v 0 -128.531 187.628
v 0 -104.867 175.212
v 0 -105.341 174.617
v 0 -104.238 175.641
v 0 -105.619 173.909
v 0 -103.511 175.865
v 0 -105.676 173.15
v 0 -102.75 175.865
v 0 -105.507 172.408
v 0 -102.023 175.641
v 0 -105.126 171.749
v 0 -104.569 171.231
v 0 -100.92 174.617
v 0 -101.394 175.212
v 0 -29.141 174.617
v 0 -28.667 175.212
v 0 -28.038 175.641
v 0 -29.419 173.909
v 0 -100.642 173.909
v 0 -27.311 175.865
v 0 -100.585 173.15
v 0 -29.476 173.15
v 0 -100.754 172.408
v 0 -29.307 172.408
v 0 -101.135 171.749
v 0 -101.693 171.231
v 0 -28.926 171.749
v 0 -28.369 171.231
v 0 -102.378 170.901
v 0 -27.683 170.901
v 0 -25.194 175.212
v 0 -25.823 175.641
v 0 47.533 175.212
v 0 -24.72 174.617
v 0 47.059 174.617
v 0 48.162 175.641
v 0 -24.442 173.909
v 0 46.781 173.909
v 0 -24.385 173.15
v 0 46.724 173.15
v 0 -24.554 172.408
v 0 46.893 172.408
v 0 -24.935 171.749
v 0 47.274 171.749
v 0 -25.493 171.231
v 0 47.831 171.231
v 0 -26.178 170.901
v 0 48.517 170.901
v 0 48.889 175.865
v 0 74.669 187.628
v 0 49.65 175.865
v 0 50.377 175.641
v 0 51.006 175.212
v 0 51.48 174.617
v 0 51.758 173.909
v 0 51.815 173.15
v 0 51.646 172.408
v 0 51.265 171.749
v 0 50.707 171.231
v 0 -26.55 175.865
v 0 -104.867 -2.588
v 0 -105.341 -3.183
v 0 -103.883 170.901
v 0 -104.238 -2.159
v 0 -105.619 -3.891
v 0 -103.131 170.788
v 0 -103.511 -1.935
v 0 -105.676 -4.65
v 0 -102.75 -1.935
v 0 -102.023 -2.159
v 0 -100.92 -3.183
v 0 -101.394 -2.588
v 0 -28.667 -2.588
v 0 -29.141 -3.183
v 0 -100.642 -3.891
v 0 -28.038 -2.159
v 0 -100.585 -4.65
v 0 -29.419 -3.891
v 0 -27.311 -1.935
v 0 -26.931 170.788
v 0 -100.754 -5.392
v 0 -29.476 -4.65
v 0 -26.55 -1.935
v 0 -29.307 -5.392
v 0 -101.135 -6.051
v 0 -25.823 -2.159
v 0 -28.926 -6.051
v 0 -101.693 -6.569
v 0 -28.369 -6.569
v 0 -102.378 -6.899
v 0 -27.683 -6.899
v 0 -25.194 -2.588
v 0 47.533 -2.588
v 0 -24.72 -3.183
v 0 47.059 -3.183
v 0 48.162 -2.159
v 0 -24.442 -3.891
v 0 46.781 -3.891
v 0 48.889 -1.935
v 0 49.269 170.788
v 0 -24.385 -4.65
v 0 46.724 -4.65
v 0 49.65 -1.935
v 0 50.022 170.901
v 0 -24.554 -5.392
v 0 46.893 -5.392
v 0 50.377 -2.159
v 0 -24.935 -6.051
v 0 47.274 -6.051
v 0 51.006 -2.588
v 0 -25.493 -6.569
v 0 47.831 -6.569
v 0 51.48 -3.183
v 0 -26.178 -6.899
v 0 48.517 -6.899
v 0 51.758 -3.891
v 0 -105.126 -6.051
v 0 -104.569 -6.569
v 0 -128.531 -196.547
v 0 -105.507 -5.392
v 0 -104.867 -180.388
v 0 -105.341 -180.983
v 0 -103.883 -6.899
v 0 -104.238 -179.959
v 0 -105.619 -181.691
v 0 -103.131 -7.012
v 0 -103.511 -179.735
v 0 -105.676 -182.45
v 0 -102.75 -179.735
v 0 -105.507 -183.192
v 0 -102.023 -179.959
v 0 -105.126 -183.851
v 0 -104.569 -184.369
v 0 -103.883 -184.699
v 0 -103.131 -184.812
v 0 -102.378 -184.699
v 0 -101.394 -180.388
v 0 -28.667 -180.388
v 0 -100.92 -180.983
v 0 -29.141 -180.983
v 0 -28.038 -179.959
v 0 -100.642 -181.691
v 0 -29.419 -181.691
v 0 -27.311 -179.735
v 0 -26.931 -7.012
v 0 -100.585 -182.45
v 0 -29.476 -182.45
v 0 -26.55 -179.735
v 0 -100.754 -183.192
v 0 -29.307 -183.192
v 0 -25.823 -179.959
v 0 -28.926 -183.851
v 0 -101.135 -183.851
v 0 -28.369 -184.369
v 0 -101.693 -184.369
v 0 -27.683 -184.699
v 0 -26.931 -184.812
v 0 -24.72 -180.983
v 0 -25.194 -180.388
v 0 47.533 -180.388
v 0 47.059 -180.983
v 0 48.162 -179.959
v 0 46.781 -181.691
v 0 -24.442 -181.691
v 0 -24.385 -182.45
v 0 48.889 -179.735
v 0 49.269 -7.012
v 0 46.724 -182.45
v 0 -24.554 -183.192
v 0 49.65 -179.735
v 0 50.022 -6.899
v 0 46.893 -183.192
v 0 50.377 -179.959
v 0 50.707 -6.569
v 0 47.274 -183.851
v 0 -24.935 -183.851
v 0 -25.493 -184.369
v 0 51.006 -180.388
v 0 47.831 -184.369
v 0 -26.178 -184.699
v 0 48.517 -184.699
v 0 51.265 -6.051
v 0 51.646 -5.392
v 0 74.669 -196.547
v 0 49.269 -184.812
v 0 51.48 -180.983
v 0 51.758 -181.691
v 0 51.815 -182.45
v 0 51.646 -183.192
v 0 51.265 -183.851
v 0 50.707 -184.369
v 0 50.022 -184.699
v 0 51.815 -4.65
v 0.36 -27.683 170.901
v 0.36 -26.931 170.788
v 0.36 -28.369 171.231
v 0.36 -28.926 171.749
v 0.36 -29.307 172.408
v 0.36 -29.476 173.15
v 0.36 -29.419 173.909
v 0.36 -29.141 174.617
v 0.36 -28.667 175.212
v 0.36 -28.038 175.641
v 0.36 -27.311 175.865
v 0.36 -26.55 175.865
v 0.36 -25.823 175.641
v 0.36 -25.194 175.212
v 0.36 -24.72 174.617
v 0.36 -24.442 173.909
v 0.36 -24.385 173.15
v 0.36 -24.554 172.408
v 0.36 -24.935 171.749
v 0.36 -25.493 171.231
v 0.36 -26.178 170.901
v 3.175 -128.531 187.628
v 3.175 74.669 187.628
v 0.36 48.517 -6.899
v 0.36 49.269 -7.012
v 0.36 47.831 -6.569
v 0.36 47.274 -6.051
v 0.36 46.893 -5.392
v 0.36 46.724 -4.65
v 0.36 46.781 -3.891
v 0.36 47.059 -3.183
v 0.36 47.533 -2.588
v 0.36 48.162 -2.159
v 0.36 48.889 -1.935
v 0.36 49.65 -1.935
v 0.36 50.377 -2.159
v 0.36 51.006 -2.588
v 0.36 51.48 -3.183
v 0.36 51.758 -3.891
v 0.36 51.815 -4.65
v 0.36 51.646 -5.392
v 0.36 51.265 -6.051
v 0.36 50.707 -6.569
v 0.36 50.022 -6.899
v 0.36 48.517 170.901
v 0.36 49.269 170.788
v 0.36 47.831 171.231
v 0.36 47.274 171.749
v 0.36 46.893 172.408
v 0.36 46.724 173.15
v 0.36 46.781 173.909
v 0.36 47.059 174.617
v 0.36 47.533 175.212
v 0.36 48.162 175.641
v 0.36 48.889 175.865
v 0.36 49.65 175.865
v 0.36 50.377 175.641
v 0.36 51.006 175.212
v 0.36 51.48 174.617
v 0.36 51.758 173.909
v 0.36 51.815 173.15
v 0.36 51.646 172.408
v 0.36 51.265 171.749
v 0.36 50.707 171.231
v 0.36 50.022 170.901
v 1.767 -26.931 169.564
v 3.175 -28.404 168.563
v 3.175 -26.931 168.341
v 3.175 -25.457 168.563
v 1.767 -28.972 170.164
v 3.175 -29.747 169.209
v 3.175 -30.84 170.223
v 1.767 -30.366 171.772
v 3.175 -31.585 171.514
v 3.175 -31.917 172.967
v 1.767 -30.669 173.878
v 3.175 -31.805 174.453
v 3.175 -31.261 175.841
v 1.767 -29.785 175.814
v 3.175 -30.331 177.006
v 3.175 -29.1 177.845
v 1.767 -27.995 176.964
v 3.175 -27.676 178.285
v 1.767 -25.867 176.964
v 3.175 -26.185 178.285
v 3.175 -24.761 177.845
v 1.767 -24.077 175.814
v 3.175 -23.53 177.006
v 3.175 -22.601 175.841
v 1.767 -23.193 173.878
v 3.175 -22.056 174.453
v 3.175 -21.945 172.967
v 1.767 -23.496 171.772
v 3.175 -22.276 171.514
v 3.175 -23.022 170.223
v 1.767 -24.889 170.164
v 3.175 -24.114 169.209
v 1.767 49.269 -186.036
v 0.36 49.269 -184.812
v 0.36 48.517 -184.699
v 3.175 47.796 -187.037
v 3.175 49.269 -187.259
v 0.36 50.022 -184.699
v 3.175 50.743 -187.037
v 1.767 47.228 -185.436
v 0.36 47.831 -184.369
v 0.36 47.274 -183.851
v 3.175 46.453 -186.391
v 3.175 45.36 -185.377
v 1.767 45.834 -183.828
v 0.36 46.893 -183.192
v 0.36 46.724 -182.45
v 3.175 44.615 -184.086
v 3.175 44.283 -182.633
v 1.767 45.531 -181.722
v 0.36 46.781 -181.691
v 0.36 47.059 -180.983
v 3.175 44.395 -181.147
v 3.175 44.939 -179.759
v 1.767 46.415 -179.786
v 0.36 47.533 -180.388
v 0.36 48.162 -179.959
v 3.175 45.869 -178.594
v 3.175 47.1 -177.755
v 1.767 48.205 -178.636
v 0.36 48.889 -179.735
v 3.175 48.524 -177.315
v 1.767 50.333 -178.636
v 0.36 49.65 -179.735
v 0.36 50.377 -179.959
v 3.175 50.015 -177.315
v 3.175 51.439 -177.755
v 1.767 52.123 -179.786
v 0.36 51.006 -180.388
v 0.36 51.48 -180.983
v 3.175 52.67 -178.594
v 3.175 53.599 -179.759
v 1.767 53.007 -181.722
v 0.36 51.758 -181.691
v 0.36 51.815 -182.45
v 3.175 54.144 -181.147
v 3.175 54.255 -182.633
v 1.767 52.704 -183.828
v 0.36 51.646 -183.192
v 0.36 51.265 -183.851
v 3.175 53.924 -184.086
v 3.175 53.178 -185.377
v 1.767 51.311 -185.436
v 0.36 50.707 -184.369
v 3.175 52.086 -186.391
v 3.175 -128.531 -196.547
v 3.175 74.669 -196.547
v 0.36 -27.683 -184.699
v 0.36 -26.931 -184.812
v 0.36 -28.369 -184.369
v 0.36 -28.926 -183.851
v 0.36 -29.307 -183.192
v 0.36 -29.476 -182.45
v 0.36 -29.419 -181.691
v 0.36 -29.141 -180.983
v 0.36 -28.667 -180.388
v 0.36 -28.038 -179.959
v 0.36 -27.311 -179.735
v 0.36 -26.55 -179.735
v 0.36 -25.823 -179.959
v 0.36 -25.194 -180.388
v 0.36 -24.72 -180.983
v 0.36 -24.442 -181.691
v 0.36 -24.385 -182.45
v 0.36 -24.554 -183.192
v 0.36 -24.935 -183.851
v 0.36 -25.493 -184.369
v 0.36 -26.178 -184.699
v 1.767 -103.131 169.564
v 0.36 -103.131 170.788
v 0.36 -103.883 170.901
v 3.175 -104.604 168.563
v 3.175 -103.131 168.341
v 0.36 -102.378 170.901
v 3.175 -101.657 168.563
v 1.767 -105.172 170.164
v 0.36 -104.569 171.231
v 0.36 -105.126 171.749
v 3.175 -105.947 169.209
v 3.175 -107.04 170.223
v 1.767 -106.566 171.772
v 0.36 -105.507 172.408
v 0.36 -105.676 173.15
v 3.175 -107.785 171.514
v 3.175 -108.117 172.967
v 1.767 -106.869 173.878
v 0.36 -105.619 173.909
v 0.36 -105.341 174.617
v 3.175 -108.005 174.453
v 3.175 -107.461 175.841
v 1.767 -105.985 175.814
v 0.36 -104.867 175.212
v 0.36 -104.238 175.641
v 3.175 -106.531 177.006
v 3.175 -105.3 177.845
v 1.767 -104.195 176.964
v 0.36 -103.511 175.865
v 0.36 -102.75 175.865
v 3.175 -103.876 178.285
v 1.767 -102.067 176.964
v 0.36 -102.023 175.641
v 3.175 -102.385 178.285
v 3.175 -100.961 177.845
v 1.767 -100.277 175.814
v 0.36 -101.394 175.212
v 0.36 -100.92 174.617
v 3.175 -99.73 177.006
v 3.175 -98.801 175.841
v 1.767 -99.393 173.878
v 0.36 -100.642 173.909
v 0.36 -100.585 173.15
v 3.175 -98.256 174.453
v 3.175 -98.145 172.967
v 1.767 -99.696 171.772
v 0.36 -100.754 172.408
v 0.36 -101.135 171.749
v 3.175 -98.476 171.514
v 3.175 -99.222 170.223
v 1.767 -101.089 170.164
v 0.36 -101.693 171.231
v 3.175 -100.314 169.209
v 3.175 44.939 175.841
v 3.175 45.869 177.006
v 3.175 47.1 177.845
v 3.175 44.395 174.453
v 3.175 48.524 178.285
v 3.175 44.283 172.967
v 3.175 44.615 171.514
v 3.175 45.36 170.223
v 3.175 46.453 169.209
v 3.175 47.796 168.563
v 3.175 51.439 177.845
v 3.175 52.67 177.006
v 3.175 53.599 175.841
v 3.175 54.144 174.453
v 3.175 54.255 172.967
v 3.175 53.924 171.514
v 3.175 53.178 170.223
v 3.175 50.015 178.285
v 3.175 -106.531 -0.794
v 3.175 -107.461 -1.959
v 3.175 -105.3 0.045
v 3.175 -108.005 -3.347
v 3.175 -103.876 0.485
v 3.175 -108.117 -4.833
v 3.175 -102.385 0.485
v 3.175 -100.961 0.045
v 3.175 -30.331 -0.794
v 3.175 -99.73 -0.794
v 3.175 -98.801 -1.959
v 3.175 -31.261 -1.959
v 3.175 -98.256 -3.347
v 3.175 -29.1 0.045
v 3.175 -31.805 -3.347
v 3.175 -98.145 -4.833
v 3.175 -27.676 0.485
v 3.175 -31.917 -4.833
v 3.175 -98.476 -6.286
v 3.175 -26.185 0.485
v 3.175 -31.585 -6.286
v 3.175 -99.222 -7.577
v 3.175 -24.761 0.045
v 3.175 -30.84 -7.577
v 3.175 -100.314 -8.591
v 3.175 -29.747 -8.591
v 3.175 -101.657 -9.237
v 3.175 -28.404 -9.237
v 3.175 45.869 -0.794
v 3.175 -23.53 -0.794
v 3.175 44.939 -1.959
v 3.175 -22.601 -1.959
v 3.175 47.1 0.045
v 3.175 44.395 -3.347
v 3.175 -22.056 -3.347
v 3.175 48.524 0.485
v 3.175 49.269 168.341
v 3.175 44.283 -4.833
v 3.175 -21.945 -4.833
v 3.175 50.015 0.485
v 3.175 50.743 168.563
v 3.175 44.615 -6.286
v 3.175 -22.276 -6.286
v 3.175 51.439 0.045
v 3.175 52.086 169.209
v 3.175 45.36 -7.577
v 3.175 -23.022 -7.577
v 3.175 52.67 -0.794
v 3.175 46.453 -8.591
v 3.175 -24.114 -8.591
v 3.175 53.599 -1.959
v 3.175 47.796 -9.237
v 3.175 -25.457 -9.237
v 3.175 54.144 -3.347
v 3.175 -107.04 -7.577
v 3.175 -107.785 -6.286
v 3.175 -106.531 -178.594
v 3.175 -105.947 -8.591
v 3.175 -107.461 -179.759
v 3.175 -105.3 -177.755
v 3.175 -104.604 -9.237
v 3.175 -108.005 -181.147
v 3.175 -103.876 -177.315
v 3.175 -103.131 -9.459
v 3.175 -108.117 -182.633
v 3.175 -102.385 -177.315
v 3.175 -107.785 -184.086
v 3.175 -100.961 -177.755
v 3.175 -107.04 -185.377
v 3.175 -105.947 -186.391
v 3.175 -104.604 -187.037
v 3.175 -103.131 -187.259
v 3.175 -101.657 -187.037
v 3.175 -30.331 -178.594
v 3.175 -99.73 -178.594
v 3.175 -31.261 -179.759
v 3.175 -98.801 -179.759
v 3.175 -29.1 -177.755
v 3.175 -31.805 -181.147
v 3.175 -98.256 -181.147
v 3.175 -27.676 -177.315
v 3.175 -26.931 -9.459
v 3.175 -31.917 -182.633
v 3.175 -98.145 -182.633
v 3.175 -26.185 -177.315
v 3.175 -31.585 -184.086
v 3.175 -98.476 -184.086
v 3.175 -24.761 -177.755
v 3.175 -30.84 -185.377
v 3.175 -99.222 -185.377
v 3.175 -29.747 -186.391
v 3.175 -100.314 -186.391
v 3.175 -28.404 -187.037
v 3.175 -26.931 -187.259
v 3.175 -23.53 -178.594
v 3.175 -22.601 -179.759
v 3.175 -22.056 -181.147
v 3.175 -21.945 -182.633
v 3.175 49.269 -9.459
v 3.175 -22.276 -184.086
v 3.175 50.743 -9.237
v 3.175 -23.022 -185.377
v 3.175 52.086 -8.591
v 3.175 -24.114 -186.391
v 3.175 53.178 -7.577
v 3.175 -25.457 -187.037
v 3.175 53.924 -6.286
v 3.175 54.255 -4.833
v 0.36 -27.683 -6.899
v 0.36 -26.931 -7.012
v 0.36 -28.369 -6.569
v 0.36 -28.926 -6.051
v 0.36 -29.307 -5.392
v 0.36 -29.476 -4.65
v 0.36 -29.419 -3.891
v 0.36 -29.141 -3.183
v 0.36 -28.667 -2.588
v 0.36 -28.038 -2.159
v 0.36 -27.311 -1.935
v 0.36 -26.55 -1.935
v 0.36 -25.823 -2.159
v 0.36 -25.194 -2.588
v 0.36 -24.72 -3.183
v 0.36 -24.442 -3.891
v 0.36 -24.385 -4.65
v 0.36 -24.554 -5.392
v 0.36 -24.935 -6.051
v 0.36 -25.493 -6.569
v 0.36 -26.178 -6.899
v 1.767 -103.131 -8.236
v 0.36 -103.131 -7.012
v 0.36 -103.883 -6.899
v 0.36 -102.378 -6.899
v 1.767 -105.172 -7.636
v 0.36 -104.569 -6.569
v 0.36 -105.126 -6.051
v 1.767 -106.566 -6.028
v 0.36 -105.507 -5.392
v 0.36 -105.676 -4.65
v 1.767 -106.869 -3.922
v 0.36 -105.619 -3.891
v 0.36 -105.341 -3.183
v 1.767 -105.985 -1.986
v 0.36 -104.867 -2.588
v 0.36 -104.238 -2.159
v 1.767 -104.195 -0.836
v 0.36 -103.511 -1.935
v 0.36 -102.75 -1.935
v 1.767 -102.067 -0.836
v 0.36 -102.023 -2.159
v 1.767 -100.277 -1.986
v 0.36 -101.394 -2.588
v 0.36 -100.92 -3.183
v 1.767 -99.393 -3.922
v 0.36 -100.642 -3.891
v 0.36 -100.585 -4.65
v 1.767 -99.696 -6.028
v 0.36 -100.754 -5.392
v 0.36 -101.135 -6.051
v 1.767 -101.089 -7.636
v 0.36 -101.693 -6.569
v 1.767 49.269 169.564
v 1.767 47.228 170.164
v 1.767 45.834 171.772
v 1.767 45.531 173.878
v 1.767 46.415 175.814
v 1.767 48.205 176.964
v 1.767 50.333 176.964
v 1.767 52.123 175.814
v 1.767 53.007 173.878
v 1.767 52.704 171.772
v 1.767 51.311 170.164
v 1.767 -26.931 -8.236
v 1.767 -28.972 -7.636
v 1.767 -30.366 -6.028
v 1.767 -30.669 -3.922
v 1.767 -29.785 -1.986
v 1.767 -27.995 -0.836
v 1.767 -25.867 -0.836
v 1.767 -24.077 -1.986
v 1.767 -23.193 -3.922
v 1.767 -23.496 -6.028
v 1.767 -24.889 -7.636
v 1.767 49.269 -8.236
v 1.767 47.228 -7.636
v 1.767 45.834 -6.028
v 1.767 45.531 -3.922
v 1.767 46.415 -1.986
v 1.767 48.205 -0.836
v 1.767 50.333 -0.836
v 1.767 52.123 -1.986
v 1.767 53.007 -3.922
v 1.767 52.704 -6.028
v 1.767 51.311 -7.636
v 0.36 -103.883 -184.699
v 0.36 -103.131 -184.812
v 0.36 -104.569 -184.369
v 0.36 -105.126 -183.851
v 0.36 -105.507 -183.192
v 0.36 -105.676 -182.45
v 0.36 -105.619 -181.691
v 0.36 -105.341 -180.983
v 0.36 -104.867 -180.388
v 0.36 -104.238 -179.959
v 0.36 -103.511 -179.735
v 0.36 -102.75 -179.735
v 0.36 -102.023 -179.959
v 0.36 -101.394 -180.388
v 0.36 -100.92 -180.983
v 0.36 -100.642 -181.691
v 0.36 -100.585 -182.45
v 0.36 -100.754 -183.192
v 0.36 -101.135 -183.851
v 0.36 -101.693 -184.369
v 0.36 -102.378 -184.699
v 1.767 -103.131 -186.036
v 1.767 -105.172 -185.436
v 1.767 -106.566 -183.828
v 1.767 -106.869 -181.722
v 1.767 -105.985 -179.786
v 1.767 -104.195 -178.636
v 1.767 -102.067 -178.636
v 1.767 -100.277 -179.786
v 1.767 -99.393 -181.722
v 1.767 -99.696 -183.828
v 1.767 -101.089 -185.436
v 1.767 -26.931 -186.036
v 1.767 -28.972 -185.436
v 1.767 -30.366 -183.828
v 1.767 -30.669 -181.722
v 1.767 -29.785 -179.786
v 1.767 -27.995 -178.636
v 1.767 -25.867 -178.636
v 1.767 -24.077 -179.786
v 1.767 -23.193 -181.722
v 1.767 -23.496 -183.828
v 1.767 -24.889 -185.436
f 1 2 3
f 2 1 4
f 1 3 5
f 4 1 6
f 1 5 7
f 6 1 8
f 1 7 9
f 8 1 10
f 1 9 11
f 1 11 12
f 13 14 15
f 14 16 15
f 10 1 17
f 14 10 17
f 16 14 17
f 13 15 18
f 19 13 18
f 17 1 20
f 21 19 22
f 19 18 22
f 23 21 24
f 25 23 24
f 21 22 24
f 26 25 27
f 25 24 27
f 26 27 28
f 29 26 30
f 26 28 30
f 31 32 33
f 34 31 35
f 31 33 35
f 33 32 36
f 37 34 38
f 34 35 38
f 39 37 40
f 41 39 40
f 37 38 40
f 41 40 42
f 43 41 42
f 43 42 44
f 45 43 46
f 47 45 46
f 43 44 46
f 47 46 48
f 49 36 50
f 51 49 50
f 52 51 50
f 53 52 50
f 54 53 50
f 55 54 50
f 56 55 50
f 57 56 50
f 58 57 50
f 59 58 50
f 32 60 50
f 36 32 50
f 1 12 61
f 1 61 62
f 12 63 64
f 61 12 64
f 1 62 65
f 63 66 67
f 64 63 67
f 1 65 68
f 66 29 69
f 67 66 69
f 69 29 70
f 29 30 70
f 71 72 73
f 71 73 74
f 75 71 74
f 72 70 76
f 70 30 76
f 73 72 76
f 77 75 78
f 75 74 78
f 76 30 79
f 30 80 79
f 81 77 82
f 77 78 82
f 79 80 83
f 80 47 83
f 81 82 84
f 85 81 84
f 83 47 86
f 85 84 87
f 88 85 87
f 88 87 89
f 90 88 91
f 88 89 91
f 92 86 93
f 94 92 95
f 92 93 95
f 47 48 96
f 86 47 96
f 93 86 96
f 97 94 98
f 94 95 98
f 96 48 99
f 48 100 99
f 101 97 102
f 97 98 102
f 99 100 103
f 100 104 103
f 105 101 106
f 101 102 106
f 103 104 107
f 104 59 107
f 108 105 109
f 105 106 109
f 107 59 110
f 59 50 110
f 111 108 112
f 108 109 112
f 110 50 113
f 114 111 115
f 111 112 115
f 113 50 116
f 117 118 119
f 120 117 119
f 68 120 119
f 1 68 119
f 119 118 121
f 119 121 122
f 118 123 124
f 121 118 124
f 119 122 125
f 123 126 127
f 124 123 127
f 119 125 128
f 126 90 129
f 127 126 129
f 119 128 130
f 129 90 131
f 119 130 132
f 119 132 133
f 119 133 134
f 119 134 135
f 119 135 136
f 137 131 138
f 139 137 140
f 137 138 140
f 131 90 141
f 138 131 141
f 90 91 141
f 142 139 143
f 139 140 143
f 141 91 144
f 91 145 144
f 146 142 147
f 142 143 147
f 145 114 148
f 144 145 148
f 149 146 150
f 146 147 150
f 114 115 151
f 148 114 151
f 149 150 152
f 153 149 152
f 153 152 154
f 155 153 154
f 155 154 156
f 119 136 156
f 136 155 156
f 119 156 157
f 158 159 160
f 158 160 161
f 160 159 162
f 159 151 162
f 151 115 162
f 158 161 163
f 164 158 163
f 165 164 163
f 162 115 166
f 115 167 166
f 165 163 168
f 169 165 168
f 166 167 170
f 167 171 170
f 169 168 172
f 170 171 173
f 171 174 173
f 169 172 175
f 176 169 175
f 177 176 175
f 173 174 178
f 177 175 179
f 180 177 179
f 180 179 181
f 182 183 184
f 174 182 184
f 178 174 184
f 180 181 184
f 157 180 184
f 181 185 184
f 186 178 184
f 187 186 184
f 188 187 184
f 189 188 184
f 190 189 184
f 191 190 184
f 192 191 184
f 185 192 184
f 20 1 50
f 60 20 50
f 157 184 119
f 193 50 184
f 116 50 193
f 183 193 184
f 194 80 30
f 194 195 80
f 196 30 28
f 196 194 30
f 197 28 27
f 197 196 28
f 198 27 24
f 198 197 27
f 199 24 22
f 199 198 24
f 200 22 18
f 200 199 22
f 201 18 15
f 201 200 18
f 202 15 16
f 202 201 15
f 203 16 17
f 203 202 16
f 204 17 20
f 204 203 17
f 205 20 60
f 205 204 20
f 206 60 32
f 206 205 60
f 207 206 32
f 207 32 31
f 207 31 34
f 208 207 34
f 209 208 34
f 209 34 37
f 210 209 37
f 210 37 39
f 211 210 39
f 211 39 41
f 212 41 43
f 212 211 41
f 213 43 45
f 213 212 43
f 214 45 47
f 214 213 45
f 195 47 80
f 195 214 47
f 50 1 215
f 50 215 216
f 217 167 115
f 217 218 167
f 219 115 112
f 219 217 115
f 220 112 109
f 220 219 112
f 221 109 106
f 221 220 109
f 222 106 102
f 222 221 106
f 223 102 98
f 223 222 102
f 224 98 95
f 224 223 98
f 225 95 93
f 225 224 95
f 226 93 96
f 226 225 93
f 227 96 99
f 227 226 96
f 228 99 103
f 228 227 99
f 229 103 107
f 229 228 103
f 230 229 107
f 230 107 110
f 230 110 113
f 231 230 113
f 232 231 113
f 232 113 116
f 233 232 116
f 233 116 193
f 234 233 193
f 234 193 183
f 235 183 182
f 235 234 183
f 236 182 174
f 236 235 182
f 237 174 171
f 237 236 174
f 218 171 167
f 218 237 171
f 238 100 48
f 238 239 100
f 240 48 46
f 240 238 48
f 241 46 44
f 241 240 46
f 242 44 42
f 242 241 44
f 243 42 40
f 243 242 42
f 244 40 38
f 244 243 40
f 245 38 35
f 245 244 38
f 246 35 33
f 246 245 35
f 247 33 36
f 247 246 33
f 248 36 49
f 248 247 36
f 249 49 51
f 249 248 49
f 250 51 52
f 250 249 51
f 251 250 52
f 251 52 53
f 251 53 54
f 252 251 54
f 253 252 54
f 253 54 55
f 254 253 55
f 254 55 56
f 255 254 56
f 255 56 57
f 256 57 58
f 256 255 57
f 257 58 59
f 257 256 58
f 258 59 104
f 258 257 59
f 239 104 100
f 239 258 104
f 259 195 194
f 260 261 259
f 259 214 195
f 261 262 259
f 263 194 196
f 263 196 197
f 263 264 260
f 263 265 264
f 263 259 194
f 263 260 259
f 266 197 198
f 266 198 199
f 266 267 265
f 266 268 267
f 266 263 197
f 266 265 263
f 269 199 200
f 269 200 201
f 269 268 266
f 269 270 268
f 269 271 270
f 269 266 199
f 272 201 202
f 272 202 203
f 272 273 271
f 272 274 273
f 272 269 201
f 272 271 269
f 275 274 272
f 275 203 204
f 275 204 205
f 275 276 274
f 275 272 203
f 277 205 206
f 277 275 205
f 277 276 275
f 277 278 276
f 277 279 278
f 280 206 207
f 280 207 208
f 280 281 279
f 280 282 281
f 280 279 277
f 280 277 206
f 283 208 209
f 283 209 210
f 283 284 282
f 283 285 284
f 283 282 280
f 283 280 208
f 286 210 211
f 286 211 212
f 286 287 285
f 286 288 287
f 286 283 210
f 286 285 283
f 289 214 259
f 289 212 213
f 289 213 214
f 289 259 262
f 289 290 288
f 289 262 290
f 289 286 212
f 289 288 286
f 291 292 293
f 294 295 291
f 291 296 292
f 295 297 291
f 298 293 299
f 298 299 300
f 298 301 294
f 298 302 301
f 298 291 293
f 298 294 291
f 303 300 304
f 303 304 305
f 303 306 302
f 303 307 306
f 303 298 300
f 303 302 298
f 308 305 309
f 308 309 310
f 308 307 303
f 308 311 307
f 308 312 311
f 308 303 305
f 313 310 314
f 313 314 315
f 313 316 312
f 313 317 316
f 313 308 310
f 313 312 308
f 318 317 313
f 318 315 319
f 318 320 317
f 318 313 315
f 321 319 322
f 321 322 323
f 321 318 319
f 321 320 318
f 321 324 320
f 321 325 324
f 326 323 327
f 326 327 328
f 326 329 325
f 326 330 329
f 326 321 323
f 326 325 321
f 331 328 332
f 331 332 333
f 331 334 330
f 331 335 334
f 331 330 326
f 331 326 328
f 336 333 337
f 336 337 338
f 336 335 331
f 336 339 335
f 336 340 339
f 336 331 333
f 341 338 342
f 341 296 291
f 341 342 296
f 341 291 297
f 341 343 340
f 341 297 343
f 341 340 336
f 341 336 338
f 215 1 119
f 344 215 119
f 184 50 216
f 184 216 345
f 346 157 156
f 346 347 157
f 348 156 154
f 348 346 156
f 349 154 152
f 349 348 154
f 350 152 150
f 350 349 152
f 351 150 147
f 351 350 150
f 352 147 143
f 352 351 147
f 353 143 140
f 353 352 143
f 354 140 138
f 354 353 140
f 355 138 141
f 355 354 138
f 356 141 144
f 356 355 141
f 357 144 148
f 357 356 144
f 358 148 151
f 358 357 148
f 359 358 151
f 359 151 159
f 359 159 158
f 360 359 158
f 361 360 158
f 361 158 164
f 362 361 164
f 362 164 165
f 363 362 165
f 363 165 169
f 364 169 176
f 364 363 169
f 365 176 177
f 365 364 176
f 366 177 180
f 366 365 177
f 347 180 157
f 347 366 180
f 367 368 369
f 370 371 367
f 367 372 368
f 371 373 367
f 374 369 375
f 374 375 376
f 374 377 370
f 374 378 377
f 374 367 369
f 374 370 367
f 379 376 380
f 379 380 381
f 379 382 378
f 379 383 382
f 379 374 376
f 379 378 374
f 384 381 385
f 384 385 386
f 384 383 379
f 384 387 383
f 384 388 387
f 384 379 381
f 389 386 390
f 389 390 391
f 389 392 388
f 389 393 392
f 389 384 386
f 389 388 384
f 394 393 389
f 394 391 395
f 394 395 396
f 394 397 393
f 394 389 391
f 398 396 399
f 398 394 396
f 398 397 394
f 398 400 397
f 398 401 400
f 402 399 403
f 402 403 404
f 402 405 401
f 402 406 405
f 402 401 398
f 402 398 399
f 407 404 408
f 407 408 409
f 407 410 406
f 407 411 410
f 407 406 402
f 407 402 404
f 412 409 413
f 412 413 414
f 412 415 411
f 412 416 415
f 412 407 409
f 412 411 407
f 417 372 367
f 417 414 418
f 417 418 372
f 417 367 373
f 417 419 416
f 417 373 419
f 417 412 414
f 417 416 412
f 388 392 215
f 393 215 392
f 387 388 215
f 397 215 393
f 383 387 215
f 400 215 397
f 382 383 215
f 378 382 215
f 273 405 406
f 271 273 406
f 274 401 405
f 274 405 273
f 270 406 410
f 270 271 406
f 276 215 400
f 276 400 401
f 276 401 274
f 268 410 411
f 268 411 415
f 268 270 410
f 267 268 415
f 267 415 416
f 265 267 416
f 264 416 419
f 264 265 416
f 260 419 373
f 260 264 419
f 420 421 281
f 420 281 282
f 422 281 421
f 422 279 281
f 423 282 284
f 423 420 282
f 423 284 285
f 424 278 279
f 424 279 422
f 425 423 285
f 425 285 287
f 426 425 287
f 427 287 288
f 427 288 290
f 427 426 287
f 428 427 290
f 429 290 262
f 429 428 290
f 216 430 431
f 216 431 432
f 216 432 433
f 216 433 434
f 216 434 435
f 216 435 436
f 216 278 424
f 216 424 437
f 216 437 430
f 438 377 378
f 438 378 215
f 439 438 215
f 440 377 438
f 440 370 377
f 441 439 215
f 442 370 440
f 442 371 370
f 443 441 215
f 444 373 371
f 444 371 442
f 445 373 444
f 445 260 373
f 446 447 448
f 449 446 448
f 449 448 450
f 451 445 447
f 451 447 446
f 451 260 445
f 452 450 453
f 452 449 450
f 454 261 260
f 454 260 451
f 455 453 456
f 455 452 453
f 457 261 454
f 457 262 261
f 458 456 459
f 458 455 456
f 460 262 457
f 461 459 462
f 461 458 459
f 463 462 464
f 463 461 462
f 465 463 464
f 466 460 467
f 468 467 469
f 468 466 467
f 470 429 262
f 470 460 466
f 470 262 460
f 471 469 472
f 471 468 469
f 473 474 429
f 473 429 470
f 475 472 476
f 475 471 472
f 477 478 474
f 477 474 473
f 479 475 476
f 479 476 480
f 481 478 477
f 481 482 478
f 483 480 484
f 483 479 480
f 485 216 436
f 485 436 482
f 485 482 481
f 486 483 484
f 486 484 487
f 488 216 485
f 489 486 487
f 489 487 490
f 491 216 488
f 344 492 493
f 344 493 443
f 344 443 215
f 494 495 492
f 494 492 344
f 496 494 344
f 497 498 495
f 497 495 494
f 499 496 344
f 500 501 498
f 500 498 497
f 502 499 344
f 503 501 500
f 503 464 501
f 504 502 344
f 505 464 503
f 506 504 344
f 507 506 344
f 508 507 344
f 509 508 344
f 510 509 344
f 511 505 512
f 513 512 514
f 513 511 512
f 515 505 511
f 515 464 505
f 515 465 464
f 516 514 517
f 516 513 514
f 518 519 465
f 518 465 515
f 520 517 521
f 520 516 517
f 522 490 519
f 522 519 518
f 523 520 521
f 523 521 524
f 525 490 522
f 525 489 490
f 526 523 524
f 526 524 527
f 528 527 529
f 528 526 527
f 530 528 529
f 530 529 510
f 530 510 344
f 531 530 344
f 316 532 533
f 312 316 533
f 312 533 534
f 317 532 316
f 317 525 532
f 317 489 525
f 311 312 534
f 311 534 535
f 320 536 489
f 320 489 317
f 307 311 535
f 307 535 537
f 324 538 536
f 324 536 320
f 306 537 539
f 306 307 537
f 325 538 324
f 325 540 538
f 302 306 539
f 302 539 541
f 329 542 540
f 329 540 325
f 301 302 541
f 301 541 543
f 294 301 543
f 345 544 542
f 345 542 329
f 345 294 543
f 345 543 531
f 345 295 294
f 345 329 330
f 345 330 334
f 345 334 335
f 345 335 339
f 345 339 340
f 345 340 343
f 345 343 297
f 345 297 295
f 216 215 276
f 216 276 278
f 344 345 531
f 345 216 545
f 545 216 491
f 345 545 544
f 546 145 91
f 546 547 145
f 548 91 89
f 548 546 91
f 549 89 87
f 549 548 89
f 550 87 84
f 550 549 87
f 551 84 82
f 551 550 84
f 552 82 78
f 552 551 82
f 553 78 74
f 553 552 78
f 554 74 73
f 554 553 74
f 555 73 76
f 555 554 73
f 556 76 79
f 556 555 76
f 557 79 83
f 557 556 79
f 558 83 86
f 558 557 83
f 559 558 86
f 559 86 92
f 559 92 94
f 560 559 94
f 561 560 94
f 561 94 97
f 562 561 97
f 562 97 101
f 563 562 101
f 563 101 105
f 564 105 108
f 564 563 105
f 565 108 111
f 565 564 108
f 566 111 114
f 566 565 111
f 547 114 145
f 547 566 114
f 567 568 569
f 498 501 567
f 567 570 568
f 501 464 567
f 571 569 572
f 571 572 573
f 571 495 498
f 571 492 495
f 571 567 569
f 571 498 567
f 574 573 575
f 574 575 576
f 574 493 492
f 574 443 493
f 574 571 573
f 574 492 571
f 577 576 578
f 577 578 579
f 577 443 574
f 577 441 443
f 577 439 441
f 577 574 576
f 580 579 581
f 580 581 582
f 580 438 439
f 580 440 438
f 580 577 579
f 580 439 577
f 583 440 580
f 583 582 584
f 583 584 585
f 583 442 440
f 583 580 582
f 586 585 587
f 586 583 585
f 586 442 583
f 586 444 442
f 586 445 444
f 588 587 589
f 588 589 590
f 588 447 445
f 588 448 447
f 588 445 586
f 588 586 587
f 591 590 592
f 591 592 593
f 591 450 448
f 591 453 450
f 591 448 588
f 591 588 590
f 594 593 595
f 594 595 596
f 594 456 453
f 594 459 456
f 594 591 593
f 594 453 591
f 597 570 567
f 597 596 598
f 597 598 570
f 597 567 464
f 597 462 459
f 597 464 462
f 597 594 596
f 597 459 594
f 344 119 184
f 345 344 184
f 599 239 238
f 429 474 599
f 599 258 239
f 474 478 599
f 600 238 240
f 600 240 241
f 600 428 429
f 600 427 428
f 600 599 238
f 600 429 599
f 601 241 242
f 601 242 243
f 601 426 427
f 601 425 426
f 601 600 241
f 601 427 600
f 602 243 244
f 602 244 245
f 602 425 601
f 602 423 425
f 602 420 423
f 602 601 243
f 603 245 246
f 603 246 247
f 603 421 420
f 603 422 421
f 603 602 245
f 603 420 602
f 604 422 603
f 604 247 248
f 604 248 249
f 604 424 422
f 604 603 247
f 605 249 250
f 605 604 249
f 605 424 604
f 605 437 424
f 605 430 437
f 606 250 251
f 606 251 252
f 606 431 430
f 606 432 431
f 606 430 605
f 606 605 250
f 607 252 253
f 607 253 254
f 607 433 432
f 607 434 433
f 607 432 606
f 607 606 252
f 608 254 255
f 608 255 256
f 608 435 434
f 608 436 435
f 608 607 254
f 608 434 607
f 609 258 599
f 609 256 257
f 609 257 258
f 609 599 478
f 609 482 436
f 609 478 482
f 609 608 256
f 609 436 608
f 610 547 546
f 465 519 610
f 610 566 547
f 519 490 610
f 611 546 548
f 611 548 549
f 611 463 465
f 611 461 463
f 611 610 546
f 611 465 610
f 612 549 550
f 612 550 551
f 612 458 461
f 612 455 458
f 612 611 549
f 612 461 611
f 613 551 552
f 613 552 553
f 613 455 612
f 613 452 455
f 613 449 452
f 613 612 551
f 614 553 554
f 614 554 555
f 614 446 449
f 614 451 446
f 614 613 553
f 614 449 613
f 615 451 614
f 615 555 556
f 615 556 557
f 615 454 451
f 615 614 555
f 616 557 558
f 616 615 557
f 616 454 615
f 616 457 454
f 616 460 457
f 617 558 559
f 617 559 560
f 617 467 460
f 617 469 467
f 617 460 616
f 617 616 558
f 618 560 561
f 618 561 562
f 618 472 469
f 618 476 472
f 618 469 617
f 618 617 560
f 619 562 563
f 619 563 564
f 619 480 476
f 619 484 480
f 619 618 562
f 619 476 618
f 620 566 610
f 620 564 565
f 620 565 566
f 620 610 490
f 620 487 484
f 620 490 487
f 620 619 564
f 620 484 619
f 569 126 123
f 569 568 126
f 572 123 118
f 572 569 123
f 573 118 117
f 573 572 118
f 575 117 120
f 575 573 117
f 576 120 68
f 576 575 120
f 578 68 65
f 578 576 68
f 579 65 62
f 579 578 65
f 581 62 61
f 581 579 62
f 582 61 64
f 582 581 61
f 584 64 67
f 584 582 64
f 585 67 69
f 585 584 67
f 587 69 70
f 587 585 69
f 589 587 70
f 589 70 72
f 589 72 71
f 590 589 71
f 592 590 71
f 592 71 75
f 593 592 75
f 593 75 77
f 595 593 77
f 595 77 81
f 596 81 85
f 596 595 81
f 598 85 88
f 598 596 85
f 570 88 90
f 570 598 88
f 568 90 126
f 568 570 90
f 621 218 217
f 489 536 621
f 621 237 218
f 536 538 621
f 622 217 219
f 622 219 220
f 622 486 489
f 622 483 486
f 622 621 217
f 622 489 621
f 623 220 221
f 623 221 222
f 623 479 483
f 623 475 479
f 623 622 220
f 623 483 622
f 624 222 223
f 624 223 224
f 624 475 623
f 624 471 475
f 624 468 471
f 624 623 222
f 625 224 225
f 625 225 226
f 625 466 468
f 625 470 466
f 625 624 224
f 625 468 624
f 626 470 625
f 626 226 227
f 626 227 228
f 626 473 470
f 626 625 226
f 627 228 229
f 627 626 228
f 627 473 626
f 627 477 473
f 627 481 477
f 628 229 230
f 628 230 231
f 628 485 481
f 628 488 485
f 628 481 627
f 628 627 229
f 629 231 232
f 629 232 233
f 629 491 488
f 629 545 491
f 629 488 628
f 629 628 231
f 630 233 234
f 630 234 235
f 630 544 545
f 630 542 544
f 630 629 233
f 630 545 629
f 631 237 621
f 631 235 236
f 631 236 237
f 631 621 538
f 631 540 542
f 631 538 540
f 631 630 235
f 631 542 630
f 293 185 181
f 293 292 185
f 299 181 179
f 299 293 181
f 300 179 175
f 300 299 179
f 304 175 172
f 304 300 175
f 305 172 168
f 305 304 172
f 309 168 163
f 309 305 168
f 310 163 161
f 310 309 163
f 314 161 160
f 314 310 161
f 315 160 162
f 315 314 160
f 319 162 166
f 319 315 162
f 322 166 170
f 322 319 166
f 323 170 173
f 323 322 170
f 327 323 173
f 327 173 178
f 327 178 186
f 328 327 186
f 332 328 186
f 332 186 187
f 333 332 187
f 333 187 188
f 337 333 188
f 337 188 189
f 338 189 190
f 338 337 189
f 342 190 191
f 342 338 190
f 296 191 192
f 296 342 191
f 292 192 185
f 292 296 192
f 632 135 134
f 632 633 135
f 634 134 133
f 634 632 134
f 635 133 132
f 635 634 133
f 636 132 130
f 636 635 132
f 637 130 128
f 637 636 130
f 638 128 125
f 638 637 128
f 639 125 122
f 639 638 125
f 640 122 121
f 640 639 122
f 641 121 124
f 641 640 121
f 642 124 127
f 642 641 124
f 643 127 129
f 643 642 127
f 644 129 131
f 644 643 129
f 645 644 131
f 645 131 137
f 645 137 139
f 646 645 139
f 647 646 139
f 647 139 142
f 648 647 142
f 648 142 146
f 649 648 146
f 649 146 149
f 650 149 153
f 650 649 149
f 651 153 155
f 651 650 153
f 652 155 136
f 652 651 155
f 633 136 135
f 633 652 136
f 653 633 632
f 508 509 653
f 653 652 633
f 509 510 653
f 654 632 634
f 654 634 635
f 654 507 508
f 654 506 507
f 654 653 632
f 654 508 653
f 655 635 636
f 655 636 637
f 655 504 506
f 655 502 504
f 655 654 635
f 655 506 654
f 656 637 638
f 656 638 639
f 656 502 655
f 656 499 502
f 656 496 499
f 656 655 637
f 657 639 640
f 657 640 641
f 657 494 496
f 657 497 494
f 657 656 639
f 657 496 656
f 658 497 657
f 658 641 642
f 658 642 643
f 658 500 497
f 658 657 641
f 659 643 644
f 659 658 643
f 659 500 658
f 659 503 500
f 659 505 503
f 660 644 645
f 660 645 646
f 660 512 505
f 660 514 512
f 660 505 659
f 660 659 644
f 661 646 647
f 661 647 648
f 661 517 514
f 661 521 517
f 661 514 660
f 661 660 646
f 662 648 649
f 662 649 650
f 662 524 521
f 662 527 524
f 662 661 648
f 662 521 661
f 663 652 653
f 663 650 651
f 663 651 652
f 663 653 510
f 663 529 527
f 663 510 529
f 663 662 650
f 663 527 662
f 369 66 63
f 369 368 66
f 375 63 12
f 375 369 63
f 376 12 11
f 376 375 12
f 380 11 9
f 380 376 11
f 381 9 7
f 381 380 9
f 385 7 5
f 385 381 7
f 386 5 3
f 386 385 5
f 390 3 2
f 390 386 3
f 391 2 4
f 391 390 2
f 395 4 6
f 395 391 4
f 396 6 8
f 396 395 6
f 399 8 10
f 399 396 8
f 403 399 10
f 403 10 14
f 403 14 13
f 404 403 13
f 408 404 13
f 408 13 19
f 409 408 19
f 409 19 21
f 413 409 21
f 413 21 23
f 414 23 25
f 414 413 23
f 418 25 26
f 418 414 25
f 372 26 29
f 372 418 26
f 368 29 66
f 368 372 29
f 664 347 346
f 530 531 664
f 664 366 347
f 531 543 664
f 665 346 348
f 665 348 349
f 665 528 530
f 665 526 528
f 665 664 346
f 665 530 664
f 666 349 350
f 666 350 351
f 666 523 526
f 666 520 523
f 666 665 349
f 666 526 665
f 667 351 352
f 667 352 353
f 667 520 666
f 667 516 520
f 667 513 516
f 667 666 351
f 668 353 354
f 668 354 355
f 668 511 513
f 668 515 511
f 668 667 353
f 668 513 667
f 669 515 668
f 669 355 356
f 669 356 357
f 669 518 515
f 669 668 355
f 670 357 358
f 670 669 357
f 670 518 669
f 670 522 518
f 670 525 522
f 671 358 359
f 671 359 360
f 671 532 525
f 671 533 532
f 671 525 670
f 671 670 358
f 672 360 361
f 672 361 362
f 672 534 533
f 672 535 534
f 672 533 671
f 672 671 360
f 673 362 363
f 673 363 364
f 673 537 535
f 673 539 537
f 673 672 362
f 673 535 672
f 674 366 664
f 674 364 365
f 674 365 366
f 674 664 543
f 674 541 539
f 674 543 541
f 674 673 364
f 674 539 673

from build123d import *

# Parameters (mm, degrees)
SKETCH1_W                                    = 384.175
SKETCH1_H                                    = 203.2
BOSS_EXTRUDE1_DEPTH                          = 3.175
CSK_FOR_10_FLAT_HEAD_MACHINE_SCREW1_AT_COUNT = 2
CSK_FOR_10_FLAT_HEAD_MACHINE_SCREW1_AT_PITCH = 76.2
CSK_FOR_10_FLAT_HEAD_MACHINE_SCREW1_2_COUNT  = 2
CSK_FOR_10_FLAT_HEAD_MACHINE_SCREW1_2_PITCH  = 152.4
CSK_FOR_10_FLAT_HEAD_MACHINE_SCREW1_3_COUNT  = 2
CSK_FOR_10_FLAT_HEAD_MACHINE_SCREW1_3_PITCH  = 177.8
CSK_FOR_10_FLAT_HEAD_MACHINE_SCREW1_4_COUNT  = 2
CSK_FOR_10_FLAT_HEAD_MACHINE_SCREW1_4_PITCH  = 193.440636889
CSK_FOR_10_FLAT_HEAD_MACHINE_SCREW1_5_COUNT  = 2
CSK_FOR_10_FLAT_HEAD_MACHINE_SCREW1_5_PITCH  = 234.176429215
CSK_FOR_10_FLAT_HEAD_MACHINE_SCREW1_6_COUNT  = 2
CSK_FOR_10_FLAT_HEAD_MACHINE_SCREW1_6_PITCH  = 363.672655007
CSK_FOR_10_FLAT_HEAD_MACHINE_SCREW1_7_COUNT  = 2
CSK_FOR_10_FLAT_HEAD_MACHINE_SCREW1_7_PITCH  = 386.881273778


with BuildPart() as part:
    # Sketch1 → Boss-Extrude1 (new body)
    with BuildSketch(Plane(origin=(0, 0, 0), x_dir=(0, 0, -1), z_dir=(1, 0, 0))):
        with Locations((4.459397375, -26.930668258)):
            Rectangle(SKETCH1_W, SKETCH1_H)
    extrude(amount=BOSS_EXTRUDE1_DEPTH)

    # Sketch6 → CSK for #10 Flat Head Machine Screw1 (revolve, cut)
    with BuildSketch(Plane(origin=(3.175, 49.269331742, 173.340602625), x_dir=(0, 0, -1), z_dir=(0, 1, 0))):
        Polygon((0, 0), (0, 3.175), (2.5527, 3.175), (2.5527, 2.815182832), (4.9999011, 0), align=None)
    csk_for_10_flat_head_machine_screw1 = revolve(axis=Axis((9.525, 49.269331742, 173.340602625), (-1, 0, 0)), mode=Mode.SUBTRACT)

    # CSK for #10 Flat Head Machine Screw1 at: CSK for #10 Flat Head Machine Screw1 ×2
    with Locations(*[(0, -i * CSK_FOR_10_FLAT_HEAD_MACHINE_SCREW1_AT_PITCH, 0) for i in range(1, CSK_FOR_10_FLAT_HEAD_MACHINE_SCREW1_AT_COUNT)]):
        add(csk_for_10_flat_head_machine_screw1, mode=Mode.SUBTRACT)

    # CSK for _10 Flat Head Machine Screw1 2: CSK for #10 Flat Head Machine Screw1 ×2
    with Locations(*[(0, -i * CSK_FOR_10_FLAT_HEAD_MACHINE_SCREW1_2_PITCH, 0) for i in range(1, CSK_FOR_10_FLAT_HEAD_MACHINE_SCREW1_2_COUNT)]):
        add(csk_for_10_flat_head_machine_screw1, mode=Mode.SUBTRACT)

    # CSK for _10 Flat Head Machine Screw1 3: CSK for #10 Flat Head Machine Screw1 ×2
    with Locations(*[(0, 0, -i * CSK_FOR_10_FLAT_HEAD_MACHINE_SCREW1_3_PITCH) for i in range(1, CSK_FOR_10_FLAT_HEAD_MACHINE_SCREW1_3_COUNT)]):
        add(csk_for_10_flat_head_machine_screw1, mode=Mode.SUBTRACT)

    # CSK for _10 Flat Head Machine Screw1 4: CSK for #10 Flat Head Machine Screw1 ×2
    with Locations(*[Vector(0, -0.39391929857916763, -0.9191450300180579) * (i * CSK_FOR_10_FLAT_HEAD_MACHINE_SCREW1_4_PITCH) for i in range(1, CSK_FOR_10_FLAT_HEAD_MACHINE_SCREW1_4_COUNT)]):
        add(csk_for_10_flat_head_machine_screw1, mode=Mode.SUBTRACT)

    # CSK for _10 Flat Head Machine Screw1 5: CSK for #10 Flat Head Machine Screw1 ×2
    with Locations(*[Vector(0, -0.6507913734559685, -0.7592566023652967) * (i * CSK_FOR_10_FLAT_HEAD_MACHINE_SCREW1_5_PITCH) for i in range(1, CSK_FOR_10_FLAT_HEAD_MACHINE_SCREW1_5_COUNT)]):
        add(csk_for_10_flat_head_machine_screw1, mode=Mode.SUBTRACT)

    # CSK for _10 Flat Head Machine Screw1 6: CSK for #10 Flat Head Machine Screw1 ×2
    with Locations(*[Vector(0, -0.2095290887308736, -0.9778024140774095) * (i * CSK_FOR_10_FLAT_HEAD_MACHINE_SCREW1_6_PITCH) for i in range(1, CSK_FOR_10_FLAT_HEAD_MACHINE_SCREW1_6_COUNT)]):
        add(csk_for_10_flat_head_machine_screw1, mode=Mode.SUBTRACT)

    # CSK for _10 Flat Head Machine Screw1 7: CSK for #10 Flat Head Machine Screw1 ×2
    with Locations(*[Vector(0, -0.3939192985791678, -0.9191450300180579) * (i * CSK_FOR_10_FLAT_HEAD_MACHINE_SCREW1_7_PITCH) for i in range(1, CSK_FOR_10_FLAT_HEAD_MACHINE_SCREW1_7_COUNT)]):
        add(csk_for_10_flat_head_machine_screw1, mode=Mode.SUBTRACT)

    # Sketch8 → CSK for #10 Flat Head Machine Screw2 (revolve, cut)
    with BuildSketch(Plane(origin=(3.175, 49.269331742, -182.259397375), x_dir=(0, 0, -1), z_dir=(0, 1, 0))):
        Polygon((0, 0), (0, 3.175), (2.5527, 3.175), (2.5527, 2.815182832), (4.9999011, 0), align=None)
    revolve(axis=Axis((9.525, 49.269331742, -182.259397375), (-1, 0, 0)), mode=Mode.SUBTRACT)


solid = part.part
